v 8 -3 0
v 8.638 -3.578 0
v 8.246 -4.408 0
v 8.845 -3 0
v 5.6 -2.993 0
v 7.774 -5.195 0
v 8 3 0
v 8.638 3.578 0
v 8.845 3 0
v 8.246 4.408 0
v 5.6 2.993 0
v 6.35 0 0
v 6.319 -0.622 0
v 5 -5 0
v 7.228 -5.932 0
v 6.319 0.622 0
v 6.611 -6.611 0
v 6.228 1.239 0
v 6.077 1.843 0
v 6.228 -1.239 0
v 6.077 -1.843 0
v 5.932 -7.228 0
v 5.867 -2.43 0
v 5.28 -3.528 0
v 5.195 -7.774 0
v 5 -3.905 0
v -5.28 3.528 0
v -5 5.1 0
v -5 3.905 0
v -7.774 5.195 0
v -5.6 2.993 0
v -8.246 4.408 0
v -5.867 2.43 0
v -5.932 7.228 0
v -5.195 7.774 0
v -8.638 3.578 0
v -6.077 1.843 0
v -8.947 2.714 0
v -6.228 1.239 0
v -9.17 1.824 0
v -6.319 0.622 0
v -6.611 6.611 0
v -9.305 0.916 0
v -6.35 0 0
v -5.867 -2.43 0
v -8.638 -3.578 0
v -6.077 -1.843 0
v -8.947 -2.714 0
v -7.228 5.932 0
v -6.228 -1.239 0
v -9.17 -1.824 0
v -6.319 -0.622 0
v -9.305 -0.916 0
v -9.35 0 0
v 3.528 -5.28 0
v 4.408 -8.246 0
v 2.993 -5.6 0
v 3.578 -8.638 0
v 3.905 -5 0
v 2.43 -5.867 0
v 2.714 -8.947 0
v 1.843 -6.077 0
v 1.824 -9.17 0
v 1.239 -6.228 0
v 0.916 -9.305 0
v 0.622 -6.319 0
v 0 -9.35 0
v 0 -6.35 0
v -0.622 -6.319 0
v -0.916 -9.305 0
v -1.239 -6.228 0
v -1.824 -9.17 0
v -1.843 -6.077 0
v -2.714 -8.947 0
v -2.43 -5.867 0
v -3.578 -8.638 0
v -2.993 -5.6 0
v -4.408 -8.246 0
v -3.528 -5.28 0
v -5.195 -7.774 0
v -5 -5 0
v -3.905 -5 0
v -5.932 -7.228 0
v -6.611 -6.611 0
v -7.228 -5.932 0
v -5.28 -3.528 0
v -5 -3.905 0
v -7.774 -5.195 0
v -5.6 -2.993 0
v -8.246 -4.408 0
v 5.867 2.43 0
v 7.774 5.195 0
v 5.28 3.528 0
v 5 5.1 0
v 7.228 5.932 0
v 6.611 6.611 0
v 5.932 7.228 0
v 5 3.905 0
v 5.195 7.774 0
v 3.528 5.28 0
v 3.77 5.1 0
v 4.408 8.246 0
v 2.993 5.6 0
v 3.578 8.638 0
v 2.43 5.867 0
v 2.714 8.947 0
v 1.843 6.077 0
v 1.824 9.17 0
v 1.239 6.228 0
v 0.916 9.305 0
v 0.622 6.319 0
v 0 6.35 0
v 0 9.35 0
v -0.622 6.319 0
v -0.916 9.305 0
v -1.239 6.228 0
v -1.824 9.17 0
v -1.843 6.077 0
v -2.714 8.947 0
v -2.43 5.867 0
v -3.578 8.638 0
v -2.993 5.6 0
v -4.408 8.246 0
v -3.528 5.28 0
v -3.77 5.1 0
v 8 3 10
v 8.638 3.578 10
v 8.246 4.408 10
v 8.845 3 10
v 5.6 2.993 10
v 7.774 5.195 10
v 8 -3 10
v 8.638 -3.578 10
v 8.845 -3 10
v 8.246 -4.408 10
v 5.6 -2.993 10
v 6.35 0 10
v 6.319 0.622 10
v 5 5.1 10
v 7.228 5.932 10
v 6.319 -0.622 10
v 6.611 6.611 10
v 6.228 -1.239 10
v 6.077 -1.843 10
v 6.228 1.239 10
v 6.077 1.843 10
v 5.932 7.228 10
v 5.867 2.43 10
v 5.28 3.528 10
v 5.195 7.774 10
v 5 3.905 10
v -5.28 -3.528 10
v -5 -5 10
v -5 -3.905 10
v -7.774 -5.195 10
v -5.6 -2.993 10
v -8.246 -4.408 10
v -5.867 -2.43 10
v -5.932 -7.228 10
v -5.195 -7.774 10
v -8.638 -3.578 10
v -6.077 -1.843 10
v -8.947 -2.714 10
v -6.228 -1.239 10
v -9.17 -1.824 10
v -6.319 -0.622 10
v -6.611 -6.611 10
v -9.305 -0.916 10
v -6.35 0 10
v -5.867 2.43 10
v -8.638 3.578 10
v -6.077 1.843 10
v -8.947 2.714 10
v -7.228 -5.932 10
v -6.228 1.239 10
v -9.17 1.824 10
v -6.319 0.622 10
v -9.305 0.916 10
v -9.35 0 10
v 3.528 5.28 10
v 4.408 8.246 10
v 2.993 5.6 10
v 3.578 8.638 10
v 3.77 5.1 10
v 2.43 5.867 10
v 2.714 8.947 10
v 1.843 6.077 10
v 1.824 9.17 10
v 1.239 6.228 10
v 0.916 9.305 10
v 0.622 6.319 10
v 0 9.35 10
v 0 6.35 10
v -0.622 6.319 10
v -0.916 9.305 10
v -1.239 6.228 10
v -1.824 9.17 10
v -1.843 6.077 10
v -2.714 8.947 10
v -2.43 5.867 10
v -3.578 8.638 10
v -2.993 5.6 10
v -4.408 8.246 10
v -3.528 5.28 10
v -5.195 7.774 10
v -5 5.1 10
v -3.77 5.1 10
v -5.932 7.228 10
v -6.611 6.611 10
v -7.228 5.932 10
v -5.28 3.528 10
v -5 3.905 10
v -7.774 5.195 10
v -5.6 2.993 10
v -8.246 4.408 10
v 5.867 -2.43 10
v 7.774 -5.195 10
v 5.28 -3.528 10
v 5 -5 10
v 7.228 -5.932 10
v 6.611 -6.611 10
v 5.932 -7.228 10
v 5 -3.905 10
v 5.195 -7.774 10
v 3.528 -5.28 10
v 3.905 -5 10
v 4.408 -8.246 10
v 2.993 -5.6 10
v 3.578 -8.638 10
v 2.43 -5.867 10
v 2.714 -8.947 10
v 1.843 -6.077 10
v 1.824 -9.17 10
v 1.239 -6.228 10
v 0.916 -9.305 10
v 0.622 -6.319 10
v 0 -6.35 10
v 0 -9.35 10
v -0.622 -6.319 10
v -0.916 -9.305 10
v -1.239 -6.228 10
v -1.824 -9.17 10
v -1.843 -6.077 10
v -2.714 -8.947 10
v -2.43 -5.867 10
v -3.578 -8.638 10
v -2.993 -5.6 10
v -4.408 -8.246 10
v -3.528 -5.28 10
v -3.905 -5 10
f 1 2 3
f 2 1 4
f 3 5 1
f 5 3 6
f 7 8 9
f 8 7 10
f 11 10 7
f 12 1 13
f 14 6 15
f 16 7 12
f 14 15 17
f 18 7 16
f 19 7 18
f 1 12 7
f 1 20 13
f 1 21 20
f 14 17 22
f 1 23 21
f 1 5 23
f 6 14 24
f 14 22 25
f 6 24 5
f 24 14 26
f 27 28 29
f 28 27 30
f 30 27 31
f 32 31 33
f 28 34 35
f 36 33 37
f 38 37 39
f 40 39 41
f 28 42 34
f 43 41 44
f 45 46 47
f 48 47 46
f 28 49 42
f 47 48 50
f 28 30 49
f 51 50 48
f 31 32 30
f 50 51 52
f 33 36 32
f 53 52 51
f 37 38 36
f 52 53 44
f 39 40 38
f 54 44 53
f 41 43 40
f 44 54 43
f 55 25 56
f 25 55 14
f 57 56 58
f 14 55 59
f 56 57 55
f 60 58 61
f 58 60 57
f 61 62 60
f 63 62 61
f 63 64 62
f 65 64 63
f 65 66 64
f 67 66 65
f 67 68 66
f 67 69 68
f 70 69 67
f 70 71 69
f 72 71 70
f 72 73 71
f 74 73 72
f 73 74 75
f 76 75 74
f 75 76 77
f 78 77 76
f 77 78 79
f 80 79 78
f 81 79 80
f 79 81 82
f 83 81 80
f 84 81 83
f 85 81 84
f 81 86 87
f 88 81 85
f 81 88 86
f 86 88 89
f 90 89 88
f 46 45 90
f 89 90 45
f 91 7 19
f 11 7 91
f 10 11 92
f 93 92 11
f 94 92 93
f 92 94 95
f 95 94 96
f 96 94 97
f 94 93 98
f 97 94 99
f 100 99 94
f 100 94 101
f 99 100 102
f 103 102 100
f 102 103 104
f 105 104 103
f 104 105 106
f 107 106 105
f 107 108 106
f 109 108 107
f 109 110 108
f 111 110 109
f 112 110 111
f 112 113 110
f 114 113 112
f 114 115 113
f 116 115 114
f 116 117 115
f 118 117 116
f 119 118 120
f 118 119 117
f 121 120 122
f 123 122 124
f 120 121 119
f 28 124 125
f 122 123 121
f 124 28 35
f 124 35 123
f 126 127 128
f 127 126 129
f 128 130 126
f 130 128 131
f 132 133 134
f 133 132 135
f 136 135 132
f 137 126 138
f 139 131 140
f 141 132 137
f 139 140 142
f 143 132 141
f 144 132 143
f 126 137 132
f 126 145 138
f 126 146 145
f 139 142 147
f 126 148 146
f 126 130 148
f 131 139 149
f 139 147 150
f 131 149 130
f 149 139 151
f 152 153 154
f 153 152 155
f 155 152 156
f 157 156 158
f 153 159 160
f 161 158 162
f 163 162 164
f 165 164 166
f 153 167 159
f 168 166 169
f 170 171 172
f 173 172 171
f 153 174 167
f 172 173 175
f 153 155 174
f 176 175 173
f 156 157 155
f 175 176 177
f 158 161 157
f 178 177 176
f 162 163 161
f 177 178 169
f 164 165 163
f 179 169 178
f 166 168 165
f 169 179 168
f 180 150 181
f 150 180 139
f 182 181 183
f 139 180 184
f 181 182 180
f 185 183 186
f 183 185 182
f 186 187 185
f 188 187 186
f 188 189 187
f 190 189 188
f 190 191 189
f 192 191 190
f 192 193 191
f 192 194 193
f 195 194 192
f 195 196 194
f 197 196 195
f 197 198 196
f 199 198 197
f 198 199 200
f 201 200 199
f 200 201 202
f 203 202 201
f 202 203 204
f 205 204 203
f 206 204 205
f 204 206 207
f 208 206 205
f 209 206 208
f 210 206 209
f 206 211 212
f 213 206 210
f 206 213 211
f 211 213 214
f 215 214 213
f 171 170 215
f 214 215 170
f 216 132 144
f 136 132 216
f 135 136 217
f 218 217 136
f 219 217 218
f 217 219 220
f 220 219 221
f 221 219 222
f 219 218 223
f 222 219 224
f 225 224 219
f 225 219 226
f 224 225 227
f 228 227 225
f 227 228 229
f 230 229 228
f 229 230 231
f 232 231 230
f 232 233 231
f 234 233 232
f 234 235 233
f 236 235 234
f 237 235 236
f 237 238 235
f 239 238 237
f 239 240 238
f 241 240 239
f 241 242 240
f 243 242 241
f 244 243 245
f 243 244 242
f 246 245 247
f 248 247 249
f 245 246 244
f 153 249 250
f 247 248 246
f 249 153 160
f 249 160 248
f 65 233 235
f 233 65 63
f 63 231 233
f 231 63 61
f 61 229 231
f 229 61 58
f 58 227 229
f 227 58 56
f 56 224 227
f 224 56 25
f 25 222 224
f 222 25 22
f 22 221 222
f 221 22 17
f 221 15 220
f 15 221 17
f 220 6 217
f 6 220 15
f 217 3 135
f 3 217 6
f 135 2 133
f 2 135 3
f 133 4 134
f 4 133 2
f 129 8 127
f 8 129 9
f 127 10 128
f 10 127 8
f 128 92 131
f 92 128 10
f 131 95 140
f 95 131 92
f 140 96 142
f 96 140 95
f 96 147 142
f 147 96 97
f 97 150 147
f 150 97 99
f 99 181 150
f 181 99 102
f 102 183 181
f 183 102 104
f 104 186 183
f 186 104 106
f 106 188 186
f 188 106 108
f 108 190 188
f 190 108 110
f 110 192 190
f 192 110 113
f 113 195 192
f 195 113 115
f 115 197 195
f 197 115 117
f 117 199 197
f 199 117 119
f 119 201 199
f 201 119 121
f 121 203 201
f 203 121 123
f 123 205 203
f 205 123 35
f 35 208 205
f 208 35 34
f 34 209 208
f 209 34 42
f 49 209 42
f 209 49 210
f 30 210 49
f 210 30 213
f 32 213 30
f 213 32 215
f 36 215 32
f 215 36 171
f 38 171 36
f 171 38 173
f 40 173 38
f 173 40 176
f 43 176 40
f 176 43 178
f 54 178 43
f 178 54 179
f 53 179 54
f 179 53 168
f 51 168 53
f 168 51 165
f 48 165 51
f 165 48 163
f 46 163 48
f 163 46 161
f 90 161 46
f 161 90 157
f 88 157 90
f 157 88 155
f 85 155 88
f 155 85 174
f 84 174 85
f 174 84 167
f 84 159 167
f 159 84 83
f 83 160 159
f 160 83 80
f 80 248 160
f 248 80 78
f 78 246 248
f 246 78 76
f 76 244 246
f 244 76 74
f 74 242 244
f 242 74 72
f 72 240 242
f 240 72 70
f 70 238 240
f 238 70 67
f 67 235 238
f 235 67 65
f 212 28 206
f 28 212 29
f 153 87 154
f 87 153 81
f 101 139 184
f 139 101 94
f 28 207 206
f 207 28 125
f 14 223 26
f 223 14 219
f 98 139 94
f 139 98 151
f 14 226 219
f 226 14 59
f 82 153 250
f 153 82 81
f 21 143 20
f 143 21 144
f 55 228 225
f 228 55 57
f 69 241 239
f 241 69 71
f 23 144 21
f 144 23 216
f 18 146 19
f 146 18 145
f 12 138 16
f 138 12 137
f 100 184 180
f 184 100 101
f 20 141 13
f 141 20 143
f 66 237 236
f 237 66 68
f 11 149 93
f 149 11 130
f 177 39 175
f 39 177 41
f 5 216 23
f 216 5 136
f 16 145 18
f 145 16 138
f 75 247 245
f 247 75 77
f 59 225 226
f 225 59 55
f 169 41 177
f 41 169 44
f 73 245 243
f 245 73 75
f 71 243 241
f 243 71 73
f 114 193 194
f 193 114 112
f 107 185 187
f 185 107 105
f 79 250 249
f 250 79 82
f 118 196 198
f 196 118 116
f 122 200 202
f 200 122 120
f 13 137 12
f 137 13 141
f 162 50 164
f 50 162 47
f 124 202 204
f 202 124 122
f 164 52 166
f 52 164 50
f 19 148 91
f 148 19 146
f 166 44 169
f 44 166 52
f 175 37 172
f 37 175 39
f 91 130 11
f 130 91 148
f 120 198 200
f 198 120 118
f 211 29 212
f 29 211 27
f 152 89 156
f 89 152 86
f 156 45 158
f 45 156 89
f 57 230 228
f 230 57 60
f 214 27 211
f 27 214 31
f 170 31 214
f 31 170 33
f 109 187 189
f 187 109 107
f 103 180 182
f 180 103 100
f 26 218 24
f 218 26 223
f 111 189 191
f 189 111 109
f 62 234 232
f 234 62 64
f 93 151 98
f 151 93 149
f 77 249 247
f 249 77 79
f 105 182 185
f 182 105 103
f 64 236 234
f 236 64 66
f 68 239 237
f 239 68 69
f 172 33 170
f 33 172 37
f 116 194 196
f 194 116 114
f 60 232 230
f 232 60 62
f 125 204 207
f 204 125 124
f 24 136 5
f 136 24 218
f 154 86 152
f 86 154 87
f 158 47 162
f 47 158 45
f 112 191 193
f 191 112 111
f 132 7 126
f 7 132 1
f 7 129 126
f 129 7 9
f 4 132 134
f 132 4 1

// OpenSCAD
// Snap-on clip for lab stand rod and tubing.
// Printed flat: 10 mm tall extrusion of a 2-D profile in the XY plane.

$fn = 64;

// Dimensions
rod_id   = 12.7;   // Rod inner diameter
rod_wall = 3;      // Rod ring wall thickness
rod_od   = rod_id + 2 * rod_wall; // Rod outer diameter (18.7)
tube_id  = 6;      // Tubing inner diameter
tube_wall = 2;     // Tubing wall thickness
tube_od  = tube_id + 2 * tube_wall; // Tubing outer diameter (10)
bridge_w = 6;      // Bridge width (Y)
bridge_x1 = 8;     // Bridge start X
bridge_x2 = 12;    // Bridge end X
tube_x   = 15;     // Tubing ring center X
clip_h   = 10;     // Extrusion height (Z)

// Rod ring opening
rod_open_w = 10;   // Opening width
rod_open_y = 5;    // Opening half-height (y from -5 to 5)

// Tubing ring opening
tube_open_w = 4.5; // Opening width
tube_open_y = 2.25; // Opening half-height (y from -2.25 to 2.25)

// Build the 2D profile in the XY plane, then extrude.
difference() {
    // 1. Rod Ring (Outer)
    // Centered at origin. Outer diameter 18.7.
    // We create a full circle and cut the opening.
    translate([0, 0, 0])
    linear_extrude(height = clip_h)
    difference() {
        circle(d = rod_od);
        // Cut opening: x < 0 and -5 < y < 5
        // We use a rectangle that extends slightly past the boundaries to ensure clean cut.
        translate([-rod_open_w / 2, -rod_open_y, 0])
        square([rod_open_w, rod_open_y * 2 + 0.1]);
    }

    // 2. Tubing Ring (Outer)
    // Centered at x = 15, y = 0. Outer diameter 10.
    translate([tube_x, 0, 0])
    linear_extrude(height = clip_h)
    difference() {
        circle(d = tube_od);
        // Cut opening: x > 15 and -2.25 < y < 2.25
        // Rectangle starts at x = 15, extends right.
        translate([tube_x, -tube_open_y, 0])
        square([tube_open_w + 0.1, tube_open_y * 2 + 0.1]);
    }

    // 3. Tubing Ring (Inner Hole)
    // Centered at x = 15, y = 0. Inner diameter 6.
    // Using circle() for 2D operation to avoid warnings.
    translate([tube_x, 0, 0])
    linear_extrude(height = clip_h)
    circle(d = tube_id);

    // 4. Rod Ring (Inner Hole)
    // Centered at origin. Inner diameter 12.7.
    // Using circle() for 2D operation to avoid warnings.
    linear_extrude(height = clip_h)
    circle(d = rod_id);

    // 5. Solid Bridge
    // Joins x=8 to x=12, width 6mm in Y.
    // It must not block the rod hole (y range approx -6.35 to 6.35) or tube hole (y range approx -3 to 3).
    // The bridge is placed at y=0 with width 6, so it spans y=-3 to y=3.
    // This is safe as it is inside the rod hole and inside the tube hole.
    translate([bridge_x1, -bridge_w / 2, 0])
    linear_extrude(height = clip_h)
    square([bridge_x2 - bridge_x1, bridge_w]);
}
